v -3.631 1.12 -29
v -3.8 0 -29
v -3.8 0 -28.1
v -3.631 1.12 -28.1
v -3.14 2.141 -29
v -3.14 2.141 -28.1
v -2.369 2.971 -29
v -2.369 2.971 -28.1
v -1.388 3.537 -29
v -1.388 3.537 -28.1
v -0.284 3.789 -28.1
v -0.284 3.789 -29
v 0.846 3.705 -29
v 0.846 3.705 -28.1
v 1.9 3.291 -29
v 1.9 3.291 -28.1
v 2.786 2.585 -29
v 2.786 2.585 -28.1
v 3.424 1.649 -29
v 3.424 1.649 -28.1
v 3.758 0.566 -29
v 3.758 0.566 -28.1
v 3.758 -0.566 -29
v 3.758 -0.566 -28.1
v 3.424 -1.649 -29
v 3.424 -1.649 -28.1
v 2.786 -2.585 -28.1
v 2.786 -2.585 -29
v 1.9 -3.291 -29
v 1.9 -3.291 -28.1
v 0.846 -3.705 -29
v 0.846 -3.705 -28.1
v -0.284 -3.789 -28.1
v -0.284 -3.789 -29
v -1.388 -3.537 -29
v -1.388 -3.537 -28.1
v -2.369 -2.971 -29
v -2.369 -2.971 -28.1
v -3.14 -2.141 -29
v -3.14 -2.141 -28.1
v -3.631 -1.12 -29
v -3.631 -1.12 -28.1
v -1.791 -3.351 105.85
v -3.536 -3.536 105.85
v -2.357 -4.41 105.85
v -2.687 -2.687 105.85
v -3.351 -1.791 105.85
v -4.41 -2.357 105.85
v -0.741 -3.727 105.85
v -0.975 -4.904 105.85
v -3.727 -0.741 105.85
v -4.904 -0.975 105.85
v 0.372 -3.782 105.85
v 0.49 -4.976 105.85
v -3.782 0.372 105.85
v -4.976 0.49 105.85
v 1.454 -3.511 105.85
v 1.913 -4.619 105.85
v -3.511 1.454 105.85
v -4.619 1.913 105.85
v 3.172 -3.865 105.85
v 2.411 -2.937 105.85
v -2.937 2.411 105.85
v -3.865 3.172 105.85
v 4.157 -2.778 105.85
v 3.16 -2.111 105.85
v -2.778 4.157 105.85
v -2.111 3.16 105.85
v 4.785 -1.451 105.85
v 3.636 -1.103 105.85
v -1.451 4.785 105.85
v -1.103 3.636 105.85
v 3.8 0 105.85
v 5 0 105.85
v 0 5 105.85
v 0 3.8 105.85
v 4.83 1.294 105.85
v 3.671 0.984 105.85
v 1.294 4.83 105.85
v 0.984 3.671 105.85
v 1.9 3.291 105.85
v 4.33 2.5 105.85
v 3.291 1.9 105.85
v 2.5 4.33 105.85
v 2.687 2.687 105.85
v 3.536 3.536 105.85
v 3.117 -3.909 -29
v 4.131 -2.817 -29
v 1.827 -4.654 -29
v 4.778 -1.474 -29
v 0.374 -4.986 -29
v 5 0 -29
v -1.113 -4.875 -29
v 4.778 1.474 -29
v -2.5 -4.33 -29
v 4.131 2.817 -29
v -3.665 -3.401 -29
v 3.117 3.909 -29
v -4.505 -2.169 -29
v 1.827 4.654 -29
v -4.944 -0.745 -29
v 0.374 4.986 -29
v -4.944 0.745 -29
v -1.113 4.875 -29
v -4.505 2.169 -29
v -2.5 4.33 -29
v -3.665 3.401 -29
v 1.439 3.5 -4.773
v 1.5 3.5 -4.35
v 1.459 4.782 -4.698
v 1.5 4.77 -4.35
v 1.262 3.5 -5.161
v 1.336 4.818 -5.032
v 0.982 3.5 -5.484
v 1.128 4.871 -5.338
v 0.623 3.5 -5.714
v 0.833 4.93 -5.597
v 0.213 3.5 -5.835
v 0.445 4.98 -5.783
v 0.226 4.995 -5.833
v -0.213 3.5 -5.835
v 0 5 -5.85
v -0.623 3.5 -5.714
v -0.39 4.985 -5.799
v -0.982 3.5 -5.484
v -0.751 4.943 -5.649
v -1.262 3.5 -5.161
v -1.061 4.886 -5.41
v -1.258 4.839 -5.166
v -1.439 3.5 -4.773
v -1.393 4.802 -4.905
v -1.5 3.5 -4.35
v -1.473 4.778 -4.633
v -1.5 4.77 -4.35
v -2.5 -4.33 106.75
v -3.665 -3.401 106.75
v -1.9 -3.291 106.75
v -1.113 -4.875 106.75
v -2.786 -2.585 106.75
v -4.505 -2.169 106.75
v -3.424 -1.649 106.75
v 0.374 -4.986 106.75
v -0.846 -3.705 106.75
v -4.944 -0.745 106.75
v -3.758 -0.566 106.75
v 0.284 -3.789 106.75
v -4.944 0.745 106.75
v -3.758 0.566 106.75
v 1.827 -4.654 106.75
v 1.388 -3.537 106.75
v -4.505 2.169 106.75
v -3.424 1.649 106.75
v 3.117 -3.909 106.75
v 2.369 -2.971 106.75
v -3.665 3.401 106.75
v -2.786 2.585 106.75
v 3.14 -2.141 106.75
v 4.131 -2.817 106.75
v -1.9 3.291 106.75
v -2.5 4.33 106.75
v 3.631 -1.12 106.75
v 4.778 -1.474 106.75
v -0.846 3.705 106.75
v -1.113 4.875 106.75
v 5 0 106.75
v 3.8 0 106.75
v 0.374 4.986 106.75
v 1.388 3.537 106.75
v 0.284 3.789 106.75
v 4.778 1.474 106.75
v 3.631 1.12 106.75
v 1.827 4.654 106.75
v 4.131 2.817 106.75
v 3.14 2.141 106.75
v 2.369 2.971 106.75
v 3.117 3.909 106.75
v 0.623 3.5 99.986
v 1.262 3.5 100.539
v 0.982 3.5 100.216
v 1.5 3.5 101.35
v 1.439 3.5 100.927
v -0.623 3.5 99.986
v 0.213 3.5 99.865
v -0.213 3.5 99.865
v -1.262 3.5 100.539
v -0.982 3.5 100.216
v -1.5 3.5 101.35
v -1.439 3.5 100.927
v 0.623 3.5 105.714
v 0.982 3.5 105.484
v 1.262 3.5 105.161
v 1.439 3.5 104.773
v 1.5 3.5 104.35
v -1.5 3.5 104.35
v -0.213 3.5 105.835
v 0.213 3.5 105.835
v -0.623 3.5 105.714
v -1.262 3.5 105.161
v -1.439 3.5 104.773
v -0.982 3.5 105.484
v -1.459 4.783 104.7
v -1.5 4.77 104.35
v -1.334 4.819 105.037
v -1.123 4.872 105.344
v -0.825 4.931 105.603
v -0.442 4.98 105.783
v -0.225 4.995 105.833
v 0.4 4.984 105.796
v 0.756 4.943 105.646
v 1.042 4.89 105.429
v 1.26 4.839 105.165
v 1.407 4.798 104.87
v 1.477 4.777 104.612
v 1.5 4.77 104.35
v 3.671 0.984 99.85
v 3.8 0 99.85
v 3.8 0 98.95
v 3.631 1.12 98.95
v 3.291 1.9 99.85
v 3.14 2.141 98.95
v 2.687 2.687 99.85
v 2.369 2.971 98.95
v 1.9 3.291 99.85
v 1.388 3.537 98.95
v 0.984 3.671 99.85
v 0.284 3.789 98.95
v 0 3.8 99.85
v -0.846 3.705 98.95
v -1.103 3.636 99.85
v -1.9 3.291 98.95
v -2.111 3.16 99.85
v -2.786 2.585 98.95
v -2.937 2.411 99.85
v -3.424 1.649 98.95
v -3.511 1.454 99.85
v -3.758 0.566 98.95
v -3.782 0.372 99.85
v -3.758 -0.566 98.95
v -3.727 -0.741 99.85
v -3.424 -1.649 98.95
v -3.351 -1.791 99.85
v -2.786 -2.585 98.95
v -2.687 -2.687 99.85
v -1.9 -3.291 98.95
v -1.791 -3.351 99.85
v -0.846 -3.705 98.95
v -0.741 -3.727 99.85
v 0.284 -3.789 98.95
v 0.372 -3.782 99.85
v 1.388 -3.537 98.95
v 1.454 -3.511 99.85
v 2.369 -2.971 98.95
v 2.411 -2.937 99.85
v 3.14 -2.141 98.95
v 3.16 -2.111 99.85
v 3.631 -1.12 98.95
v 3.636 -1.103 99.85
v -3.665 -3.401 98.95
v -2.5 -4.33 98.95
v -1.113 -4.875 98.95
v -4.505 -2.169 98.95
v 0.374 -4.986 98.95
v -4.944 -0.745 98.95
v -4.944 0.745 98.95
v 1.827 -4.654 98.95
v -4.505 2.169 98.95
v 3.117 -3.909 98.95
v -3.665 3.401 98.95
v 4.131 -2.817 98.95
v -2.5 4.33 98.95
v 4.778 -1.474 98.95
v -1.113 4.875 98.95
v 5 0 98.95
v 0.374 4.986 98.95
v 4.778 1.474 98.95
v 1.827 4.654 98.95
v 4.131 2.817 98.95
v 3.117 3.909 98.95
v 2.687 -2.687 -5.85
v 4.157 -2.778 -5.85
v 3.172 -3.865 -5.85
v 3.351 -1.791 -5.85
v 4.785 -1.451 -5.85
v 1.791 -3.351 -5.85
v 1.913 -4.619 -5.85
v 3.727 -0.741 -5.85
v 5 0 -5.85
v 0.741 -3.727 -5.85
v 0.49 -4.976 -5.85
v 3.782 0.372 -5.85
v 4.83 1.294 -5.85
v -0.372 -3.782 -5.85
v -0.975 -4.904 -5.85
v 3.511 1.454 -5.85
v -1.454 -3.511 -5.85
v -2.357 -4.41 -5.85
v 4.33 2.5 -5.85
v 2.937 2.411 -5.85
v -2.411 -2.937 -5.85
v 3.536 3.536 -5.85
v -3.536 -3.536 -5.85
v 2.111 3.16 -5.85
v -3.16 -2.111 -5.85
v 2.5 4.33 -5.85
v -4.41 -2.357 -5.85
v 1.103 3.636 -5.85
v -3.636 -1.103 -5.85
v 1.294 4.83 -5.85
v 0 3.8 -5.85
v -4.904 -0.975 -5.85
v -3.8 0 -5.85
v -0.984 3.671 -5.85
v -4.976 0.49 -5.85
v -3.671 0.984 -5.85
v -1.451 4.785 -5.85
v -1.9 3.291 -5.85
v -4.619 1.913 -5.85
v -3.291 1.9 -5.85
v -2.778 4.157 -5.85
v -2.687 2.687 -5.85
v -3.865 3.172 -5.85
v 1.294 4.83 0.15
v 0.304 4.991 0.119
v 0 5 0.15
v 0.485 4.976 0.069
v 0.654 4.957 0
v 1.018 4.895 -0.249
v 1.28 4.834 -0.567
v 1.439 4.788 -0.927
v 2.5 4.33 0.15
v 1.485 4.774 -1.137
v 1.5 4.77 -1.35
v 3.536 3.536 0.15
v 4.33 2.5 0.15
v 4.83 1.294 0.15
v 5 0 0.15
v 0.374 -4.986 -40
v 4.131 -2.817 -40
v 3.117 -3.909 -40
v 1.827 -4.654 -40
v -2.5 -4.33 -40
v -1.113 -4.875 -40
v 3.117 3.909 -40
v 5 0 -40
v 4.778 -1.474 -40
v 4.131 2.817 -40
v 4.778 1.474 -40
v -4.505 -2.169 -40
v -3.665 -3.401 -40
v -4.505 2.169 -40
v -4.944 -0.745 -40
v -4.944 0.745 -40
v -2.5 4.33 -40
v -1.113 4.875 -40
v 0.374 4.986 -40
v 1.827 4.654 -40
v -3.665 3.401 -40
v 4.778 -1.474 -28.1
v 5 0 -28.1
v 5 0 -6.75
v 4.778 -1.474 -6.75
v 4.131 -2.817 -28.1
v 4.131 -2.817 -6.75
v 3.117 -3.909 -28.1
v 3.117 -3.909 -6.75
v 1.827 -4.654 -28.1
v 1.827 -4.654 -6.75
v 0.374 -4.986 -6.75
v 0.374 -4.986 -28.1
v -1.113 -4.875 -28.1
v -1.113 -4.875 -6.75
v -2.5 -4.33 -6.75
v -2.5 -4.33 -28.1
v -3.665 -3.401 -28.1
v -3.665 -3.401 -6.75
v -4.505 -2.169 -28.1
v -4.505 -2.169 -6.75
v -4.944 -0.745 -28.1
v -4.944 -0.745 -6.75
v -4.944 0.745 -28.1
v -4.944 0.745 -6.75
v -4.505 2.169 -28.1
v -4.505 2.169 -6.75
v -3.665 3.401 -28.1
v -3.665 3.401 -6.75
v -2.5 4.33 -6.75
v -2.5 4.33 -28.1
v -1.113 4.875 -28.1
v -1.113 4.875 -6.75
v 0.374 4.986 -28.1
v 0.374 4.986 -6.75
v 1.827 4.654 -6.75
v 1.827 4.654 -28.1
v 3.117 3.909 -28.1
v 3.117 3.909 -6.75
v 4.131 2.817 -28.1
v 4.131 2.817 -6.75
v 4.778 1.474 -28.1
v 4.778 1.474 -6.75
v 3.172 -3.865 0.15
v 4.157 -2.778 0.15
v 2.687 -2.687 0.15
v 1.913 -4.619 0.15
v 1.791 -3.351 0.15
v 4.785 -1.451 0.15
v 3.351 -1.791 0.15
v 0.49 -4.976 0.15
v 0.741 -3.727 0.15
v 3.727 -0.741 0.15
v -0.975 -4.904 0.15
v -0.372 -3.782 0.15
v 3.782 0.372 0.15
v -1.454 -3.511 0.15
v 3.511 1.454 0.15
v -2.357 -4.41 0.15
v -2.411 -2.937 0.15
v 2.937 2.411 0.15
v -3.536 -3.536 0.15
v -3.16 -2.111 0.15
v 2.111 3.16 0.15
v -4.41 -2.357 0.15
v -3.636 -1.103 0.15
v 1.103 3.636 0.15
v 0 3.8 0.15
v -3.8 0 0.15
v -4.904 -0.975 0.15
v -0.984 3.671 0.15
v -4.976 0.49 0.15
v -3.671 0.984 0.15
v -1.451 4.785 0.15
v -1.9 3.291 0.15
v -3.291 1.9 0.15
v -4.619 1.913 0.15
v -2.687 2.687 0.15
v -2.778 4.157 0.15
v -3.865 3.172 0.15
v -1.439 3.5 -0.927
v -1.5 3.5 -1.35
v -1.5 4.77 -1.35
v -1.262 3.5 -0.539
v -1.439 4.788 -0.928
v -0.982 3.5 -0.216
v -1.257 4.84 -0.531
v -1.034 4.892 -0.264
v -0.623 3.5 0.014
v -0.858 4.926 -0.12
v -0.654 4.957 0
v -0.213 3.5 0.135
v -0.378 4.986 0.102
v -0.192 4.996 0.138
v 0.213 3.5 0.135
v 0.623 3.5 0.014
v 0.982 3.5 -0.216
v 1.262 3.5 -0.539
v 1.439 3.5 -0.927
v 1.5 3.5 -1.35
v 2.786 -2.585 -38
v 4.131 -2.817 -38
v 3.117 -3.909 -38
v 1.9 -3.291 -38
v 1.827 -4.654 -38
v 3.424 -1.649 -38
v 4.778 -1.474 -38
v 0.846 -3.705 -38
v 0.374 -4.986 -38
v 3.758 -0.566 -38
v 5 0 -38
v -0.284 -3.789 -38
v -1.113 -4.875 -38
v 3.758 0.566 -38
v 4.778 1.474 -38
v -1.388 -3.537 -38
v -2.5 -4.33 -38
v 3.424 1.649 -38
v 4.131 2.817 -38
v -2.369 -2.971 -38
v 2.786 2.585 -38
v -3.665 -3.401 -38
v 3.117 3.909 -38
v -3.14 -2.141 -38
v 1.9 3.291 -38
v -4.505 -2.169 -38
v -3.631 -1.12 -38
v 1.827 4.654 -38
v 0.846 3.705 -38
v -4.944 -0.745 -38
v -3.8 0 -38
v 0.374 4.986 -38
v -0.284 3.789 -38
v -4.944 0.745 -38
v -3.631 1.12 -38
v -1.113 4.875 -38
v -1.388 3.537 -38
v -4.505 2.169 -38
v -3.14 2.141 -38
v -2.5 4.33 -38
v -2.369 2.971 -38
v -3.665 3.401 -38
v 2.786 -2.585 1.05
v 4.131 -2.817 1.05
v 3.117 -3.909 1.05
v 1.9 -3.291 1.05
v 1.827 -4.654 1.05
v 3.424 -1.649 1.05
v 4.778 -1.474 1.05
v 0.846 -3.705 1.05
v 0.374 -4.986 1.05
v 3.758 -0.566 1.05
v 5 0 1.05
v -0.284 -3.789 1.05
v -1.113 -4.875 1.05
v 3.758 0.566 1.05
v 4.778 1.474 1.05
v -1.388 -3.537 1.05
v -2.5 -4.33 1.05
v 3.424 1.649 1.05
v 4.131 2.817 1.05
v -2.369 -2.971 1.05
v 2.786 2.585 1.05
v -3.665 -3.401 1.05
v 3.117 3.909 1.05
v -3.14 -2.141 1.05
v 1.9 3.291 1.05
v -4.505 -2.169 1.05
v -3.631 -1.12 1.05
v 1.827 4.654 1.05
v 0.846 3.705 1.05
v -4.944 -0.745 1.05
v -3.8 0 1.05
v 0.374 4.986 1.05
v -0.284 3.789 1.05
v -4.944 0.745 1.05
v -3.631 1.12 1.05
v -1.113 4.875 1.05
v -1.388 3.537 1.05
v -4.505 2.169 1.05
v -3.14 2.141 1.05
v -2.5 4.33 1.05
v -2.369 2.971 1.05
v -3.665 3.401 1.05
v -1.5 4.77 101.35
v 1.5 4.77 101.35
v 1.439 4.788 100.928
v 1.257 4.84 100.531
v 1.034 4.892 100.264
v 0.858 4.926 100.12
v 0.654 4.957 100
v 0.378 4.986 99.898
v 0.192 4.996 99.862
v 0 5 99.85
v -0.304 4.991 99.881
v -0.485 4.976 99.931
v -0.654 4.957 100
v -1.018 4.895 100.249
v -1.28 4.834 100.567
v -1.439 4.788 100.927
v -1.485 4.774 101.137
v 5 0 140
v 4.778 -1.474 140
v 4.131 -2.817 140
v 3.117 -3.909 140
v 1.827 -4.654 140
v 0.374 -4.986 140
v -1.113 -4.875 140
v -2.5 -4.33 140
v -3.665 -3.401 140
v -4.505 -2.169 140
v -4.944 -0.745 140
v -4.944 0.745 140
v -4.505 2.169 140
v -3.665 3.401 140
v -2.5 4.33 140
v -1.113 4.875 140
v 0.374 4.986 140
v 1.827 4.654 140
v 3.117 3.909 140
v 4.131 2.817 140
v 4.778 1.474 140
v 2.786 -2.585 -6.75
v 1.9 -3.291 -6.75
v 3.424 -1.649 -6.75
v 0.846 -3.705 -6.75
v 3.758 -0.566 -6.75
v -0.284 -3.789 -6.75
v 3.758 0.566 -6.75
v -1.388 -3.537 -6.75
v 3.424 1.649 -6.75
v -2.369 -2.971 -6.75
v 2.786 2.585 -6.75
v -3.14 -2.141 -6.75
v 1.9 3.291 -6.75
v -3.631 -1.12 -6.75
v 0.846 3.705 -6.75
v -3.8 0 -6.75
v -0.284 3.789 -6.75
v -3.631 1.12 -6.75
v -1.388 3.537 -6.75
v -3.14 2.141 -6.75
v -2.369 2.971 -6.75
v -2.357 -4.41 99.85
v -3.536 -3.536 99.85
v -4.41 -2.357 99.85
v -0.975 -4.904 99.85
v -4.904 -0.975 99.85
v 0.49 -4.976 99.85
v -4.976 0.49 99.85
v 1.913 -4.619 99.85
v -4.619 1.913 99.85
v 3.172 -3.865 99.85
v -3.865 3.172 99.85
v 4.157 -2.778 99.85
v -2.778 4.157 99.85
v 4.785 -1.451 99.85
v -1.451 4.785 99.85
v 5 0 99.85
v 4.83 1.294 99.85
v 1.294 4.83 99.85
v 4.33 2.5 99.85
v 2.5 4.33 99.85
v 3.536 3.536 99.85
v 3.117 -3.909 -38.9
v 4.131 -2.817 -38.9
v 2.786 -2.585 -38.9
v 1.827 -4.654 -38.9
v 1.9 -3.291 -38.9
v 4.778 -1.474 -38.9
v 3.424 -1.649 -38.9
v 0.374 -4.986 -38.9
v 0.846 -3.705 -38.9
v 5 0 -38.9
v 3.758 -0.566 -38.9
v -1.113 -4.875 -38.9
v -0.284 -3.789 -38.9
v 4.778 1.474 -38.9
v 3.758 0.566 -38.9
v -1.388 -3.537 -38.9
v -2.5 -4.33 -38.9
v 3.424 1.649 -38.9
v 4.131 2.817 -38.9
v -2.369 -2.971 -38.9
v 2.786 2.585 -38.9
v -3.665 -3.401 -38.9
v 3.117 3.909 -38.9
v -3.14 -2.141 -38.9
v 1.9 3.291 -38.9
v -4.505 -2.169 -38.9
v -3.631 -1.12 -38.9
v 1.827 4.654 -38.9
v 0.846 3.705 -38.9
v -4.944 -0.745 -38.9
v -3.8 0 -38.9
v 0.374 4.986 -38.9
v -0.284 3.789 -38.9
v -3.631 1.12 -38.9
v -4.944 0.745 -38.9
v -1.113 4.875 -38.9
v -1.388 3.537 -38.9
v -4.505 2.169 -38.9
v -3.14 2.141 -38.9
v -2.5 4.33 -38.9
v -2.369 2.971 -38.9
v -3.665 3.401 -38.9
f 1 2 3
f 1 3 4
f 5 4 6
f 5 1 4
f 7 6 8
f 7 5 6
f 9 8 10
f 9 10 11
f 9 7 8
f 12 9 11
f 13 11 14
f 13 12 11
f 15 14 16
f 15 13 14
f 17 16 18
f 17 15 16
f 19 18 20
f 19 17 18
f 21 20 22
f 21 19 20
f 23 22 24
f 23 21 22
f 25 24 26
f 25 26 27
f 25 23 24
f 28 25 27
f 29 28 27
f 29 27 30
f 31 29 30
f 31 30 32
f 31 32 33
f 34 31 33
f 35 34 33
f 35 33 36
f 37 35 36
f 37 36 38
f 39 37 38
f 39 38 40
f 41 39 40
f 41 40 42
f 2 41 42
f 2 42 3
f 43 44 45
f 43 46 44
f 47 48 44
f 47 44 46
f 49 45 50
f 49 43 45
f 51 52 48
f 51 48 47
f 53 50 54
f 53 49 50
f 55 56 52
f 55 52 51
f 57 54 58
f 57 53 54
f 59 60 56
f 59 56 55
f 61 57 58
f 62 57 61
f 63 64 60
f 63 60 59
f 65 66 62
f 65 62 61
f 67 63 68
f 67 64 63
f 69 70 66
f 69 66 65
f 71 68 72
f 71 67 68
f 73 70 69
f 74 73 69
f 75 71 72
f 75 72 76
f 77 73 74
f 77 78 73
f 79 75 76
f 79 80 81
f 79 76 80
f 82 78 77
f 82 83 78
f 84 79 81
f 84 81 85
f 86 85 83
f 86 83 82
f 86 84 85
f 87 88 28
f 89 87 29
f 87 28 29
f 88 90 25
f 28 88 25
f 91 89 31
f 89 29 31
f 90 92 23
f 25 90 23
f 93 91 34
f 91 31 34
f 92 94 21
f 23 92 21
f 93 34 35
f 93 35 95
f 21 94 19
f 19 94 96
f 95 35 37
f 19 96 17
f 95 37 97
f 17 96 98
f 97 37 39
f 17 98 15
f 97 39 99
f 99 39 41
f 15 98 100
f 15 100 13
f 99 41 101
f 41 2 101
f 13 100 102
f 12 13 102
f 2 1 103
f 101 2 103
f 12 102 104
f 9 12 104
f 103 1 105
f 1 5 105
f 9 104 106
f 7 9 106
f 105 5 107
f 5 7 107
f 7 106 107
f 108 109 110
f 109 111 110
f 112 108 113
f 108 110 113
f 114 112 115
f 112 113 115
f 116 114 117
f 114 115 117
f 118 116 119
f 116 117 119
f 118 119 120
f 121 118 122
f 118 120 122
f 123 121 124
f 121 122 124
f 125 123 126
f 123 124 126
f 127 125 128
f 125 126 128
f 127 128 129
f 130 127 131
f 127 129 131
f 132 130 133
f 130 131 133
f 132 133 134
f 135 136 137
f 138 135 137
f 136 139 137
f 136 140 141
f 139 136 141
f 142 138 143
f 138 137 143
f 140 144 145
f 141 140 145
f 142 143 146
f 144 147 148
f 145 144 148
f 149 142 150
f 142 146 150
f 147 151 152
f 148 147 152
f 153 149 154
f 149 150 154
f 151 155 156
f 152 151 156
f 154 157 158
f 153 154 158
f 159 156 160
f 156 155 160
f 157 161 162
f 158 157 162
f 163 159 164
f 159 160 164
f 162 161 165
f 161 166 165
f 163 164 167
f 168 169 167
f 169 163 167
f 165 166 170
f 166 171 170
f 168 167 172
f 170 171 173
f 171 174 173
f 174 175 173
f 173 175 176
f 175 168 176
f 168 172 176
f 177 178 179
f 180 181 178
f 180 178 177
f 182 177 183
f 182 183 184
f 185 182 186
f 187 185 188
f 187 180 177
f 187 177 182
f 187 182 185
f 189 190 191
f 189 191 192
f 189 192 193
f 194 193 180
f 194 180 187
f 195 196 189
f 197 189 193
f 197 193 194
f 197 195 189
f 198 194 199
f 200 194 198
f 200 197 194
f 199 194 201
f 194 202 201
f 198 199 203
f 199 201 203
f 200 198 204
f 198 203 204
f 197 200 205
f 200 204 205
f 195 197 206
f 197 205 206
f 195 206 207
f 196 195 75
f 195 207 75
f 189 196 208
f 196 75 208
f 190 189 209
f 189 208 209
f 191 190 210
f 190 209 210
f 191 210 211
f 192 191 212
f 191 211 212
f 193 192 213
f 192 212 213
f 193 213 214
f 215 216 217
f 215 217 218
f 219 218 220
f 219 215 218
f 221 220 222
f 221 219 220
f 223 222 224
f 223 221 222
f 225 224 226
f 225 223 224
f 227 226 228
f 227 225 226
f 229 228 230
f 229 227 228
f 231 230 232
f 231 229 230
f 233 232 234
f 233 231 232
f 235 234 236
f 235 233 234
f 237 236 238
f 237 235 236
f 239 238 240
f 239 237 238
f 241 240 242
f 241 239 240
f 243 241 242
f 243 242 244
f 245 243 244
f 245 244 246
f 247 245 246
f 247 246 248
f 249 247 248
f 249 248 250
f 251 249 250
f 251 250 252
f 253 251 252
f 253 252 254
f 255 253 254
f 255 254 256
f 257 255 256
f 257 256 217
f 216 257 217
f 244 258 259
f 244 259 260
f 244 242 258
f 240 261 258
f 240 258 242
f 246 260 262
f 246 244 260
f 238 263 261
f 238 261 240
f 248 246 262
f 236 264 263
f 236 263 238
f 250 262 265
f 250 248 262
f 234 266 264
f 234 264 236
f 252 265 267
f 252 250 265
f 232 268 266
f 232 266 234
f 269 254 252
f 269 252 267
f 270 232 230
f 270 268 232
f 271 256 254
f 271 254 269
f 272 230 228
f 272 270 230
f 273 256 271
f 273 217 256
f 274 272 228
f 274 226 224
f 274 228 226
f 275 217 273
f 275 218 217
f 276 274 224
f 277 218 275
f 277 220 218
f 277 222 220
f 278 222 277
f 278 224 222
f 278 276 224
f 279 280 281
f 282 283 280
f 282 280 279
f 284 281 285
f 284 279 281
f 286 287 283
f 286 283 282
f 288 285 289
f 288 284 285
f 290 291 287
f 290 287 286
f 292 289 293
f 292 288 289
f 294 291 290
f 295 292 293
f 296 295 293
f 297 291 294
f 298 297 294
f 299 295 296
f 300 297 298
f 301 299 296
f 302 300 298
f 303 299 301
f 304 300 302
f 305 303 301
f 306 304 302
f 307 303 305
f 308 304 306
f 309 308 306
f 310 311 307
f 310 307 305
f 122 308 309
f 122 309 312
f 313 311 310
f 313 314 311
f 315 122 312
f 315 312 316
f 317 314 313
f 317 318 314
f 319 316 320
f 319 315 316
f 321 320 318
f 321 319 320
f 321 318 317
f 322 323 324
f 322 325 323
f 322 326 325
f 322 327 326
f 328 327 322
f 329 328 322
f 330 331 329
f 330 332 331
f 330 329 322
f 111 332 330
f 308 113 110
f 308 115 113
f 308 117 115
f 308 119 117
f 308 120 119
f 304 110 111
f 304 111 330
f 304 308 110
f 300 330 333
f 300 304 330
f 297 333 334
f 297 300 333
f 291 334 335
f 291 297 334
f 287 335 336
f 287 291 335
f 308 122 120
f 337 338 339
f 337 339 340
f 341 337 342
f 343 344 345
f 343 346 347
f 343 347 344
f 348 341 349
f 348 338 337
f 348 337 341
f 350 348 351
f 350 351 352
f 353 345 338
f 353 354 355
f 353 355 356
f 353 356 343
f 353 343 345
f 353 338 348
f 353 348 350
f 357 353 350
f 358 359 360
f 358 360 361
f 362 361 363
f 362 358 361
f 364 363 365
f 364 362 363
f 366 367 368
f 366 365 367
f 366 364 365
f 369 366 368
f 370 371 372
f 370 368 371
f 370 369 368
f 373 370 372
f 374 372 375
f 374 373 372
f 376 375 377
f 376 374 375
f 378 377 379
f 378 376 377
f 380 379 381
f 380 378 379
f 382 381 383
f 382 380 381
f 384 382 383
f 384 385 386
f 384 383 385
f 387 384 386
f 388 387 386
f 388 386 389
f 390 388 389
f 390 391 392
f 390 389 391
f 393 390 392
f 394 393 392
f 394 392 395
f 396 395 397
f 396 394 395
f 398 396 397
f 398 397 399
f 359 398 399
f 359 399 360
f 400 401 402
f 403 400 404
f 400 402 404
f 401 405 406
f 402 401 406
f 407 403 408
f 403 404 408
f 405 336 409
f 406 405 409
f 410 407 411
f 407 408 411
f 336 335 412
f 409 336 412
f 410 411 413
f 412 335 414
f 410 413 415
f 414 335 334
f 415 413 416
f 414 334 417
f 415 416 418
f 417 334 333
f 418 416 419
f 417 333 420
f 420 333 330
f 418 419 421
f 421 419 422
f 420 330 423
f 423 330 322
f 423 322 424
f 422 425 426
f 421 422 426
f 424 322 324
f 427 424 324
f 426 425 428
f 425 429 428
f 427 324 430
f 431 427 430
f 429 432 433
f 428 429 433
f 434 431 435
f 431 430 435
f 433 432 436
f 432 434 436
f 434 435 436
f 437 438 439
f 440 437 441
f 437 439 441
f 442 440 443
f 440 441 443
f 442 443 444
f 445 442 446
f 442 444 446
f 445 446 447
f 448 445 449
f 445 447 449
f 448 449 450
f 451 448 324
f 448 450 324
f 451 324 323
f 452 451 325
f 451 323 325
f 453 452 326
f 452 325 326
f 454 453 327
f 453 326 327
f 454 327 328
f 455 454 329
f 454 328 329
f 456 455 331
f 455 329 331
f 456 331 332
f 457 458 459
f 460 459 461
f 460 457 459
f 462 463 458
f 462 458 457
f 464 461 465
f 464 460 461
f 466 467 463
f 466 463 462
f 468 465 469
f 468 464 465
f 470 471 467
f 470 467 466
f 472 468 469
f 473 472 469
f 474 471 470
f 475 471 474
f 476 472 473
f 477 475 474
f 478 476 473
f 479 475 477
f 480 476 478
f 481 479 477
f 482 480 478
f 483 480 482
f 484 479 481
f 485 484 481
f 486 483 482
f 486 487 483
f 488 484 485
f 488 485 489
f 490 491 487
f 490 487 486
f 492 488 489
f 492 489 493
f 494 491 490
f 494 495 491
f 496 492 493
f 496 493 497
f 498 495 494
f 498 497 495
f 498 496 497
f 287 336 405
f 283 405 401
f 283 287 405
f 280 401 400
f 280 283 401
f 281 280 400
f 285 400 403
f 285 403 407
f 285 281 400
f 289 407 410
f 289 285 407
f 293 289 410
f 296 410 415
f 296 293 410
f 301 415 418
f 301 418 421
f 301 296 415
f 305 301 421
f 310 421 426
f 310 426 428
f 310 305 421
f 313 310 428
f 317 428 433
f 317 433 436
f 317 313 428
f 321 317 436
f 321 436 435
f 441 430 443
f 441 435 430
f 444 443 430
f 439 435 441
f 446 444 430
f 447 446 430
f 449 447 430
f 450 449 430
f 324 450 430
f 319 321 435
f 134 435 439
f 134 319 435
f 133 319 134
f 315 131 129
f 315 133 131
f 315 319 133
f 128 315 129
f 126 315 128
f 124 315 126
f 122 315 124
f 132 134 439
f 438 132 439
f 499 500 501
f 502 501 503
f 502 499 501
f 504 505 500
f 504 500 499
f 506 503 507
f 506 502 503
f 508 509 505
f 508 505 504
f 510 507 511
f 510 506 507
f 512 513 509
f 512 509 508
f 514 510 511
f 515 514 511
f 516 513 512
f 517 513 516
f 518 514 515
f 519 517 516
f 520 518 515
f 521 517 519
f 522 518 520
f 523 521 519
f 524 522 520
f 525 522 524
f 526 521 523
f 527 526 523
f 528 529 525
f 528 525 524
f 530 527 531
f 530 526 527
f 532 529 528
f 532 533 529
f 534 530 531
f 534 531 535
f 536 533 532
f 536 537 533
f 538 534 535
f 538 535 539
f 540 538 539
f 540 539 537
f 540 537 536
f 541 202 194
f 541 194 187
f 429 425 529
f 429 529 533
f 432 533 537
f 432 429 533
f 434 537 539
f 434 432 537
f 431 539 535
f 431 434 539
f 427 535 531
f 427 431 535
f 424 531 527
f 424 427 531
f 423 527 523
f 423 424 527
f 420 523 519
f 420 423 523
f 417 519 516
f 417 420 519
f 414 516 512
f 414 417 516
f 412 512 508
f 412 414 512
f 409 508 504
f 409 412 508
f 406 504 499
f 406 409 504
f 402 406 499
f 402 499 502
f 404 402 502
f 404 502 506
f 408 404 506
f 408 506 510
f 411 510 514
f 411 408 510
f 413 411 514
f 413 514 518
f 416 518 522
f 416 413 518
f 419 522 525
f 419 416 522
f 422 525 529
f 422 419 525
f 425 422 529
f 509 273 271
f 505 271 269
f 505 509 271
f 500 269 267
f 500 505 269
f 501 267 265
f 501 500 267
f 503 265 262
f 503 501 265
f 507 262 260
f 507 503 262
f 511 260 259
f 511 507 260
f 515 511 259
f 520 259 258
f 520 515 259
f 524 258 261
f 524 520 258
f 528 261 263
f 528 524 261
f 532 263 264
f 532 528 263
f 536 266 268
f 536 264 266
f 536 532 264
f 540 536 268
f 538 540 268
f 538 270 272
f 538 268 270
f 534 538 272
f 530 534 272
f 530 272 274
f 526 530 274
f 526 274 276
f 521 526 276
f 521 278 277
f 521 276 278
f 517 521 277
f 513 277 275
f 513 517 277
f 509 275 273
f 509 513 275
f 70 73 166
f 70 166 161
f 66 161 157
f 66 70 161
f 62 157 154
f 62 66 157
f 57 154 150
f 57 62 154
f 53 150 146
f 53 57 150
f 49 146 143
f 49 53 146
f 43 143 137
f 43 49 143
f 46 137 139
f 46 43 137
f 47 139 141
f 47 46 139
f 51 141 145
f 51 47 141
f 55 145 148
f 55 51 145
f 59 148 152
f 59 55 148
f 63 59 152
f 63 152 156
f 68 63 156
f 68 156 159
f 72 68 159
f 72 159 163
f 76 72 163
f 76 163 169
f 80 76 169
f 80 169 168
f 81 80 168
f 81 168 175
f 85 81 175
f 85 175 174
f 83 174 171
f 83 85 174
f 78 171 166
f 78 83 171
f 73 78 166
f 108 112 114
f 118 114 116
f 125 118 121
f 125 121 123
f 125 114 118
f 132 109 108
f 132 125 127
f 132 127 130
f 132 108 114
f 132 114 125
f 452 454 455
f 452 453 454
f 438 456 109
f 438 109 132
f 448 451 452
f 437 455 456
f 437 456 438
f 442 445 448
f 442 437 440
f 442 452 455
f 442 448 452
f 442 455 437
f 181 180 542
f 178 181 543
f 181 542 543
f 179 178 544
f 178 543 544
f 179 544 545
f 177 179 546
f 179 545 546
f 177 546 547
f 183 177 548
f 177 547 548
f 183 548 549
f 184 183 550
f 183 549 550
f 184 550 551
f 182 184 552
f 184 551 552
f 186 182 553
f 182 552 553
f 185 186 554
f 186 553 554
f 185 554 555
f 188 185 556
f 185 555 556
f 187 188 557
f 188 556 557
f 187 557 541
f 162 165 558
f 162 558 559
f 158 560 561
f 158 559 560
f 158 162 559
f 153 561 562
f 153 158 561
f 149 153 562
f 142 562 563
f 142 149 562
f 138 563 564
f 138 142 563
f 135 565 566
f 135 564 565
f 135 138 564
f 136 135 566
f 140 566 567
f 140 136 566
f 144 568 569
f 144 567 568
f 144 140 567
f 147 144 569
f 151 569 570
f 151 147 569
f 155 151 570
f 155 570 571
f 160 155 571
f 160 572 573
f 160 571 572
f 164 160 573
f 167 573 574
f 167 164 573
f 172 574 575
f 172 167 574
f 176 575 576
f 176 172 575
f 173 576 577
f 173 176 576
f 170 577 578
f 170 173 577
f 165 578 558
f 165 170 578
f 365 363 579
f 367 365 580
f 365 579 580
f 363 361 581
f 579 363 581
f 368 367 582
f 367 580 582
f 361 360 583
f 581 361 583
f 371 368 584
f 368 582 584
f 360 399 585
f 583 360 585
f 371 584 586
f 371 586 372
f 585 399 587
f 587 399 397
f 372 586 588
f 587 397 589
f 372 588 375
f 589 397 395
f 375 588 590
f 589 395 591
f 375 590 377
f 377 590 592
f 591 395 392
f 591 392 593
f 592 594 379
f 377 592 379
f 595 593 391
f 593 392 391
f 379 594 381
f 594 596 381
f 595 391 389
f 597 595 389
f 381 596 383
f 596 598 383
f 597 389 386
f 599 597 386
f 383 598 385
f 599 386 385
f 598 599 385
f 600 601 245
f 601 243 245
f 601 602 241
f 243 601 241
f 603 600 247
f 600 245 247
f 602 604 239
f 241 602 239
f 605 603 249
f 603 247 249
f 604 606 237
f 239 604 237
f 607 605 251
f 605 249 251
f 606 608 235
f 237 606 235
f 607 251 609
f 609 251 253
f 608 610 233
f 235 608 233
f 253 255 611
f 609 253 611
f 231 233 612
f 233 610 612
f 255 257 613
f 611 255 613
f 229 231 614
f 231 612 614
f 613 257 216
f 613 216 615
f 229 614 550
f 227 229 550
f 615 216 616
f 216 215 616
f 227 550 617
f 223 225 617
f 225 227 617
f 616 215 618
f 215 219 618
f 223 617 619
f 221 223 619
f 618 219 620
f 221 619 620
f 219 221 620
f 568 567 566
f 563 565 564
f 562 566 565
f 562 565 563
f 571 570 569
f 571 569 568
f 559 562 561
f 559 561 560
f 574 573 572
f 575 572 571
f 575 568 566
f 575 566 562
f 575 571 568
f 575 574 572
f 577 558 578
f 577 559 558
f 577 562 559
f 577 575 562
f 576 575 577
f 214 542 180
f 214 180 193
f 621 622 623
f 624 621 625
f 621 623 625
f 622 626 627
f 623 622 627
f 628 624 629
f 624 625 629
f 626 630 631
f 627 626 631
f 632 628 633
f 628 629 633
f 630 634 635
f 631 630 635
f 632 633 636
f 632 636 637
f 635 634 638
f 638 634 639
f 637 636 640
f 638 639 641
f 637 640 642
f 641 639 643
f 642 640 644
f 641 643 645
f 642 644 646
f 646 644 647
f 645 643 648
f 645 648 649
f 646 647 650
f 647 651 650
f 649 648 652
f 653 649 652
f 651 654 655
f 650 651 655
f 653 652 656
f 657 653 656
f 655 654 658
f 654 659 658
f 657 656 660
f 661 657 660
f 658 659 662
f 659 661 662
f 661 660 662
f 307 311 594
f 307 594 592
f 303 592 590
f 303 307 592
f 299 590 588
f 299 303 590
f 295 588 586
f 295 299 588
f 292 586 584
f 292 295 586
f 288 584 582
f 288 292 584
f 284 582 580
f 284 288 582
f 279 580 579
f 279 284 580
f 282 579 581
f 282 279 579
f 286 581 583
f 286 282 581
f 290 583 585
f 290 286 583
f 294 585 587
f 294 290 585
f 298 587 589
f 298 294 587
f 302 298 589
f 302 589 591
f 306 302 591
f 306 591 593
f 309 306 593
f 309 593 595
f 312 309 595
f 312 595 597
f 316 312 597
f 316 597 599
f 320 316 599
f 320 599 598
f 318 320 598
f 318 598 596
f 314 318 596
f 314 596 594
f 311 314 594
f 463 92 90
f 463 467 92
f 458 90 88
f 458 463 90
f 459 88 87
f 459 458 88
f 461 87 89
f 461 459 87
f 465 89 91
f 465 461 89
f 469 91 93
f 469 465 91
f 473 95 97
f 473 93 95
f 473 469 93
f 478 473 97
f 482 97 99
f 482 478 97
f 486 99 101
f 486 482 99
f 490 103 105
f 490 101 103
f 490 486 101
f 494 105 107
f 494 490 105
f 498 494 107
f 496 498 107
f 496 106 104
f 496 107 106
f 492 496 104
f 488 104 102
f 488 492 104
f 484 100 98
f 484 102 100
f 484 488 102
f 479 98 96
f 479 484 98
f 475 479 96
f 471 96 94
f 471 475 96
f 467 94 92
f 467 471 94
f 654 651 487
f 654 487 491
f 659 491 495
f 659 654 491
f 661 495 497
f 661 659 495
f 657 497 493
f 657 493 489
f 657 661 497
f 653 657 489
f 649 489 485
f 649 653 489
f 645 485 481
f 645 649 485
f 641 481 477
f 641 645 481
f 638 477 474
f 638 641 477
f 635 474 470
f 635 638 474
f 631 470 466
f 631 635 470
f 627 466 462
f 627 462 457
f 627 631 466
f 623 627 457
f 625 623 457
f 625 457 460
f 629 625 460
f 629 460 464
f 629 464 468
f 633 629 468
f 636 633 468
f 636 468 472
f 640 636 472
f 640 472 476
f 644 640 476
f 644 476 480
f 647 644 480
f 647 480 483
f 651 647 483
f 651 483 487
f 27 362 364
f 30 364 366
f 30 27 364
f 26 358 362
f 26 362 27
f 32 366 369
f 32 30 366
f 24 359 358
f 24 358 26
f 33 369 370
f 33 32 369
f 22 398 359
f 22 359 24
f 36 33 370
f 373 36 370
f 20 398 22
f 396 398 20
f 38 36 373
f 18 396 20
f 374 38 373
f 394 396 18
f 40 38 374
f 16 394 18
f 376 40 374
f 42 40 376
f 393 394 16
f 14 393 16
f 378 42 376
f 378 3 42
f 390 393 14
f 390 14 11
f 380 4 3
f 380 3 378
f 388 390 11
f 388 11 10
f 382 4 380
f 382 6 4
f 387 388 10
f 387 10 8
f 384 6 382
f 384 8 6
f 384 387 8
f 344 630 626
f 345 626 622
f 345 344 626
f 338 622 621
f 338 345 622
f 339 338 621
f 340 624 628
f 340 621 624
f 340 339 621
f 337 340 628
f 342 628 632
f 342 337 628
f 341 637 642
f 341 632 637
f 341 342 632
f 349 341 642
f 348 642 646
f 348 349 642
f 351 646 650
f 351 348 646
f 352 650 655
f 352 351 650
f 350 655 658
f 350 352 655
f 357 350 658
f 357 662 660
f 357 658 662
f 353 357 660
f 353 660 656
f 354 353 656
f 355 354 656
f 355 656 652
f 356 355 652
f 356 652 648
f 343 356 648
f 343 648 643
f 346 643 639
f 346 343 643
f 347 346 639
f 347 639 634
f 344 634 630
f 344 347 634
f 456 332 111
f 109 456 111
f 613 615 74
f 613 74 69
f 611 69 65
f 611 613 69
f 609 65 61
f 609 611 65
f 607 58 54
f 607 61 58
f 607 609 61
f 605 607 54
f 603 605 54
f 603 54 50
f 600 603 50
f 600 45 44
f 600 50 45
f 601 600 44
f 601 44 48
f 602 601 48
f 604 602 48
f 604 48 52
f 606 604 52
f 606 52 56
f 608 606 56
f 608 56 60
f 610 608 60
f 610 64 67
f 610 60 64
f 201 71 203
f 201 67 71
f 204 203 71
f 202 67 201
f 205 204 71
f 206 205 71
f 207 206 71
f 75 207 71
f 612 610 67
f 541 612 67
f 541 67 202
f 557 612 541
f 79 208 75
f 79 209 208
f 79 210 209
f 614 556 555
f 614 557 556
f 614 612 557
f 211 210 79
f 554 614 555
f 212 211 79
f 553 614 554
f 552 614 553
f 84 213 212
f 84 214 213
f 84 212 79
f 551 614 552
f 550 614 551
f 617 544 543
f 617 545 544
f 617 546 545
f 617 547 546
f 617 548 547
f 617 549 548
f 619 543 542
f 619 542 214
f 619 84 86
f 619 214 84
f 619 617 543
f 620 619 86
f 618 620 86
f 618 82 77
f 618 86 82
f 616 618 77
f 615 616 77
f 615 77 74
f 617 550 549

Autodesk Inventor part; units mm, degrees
sketch "Skizze1" plane through (0, 0, 0) normal (0, 0, 1) x (1, 0, 0)
  circle A0 centre (0, 0) radius 5
  dimension "d0" = 10
extrude "Extrusion1" add sketch "Skizze1" along normal blind 100
sketch "Skizze4" plane through (0, 0, 0) normal (0, 0, -1) x (-1, 0, 0)
  circle A0 centre (0, 0) radius 5
  circle A1 centre (0, 0) radius 5
  dimension "d15" = 10
extrude "Extrusion4" add sketch "Skizze4" along normal blind 50
sketch "Skizze5" plane through (0, 0, 100) normal (0, 0, 1) x (1, 0, 0)
  circle A0 centre (0, 0) radius 5
extrude "Extrusion5" add sketch "Skizze5" along normal blind 50
ref_plane "Arbeitsebene1" through (0, 5, 0) normal (0, 1, 0) x (-1, 0, 0)
sketch "Skizze6" plane through (0, 5, 0) normal (0, 1, 0) x (-1, 0, 0)
  line L0 (-5, -50) -> (5, -50) projected
  line L1 (0, -50) -> (0, 50)
  line L2 (0, 50) -> (0, 102.85)
  line L3 (0, 50) -> (0, -2.85)
  line L4 (0, -4.35) -> (0, -1.35) construction
  line L5 (1.5, -4.35) -> (1.5, -1.35)
  line L6 (-1.5, -1.35) -> (-1.5, -4.35)
  arc A0 (-1.5, -4.35) -> (1.5, -4.35) centre (0, -4.35) ccw
  arc A1 (1.5, -1.35) -> (-1.5, -1.35) centre (0, -1.35) ccw
  line L7 (0, 101.35) -> (0, 104.35) construction
  line L8 (-1.5, 101.35) -> (-1.5, 104.35)
  line L9 (1.5, 104.35) -> (1.5, 101.35)
  arc A2 (-1.5, 101.35) -> (1.5, 101.35) centre (0, 101.35) ccw
  arc A3 (1.5, 104.35) -> (-1.5, 104.35) centre (0, 104.35) ccw
  point P0 (0, 0)
  dimension "d21" = 100
  dimension "d22" = 52.85
  dimension "d23" = 52.85
  dimension "d27" = 1.5
  dimension "d28" = 6
  dimension "d29" = 1.5
  dimension "d33" = 3
extrude "Extrusion6" cut sketch "Skizze6" against normal blind 1.5
ref_plane "Arbeitsebene3" through (0, 5, 105.85) normal (0, 0, 1) x (1, 0, 0)
ref_plane "Arbeitsebene2" through (0, 5, 99.85) normal (0, 0, 1) x (1, 0, 0)
ref_plane "Arbeitsebene5" through (0, 5, -5.85) normal (0, 0, -1) x (-1, 0, 0)
ref_plane "Arbeitsebene4" through (0, 5, 0.15) normal (0, 0, -1) x (-1, 0, 0)
sketch "Skizze7" plane through (0, 5, -5.85) normal (0, 0, -1) x (-1, 0, 0)
  circle A0 centre (0, -5) radius 5
  circle A1 centre (0, -5) radius 3.8
  dimension "d34" = 7.6
extrude "Extrusion7" cut sketch "Skizze7" along normal blind 0.9
sketch "Skizze8" plane through (0, 5, 0.15) normal (0, 0, -1) x (-1, 0, 0)
  circle A0 centre (0, -5) radius 5
  circle A1 centre (0, -5) radius 3.8
  dimension "d37" = 7.6
extrude "Extrusion8" cut sketch "Skizze8" against normal blind 0.9
sketch "Skizze9" plane through (0, 5, 99.85) normal (0, 0, 1) x (1, 0, 0)
  circle A0 centre (0, -5) radius 5
  circle A1 centre (0, -5) radius 3.8
  dimension "d40" = 7.6
extrude "Extrusion9" cut sketch "Skizze9" against normal blind 0.9
sketch "Skizze10" plane through (0, 5, 105.85) normal (0, 0, 1) x (1, 0, 0)
  circle A0 centre (0, -5) radius 5
  circle A1 centre (0, -5) radius 3.8
extrude "Extrusion10" cut sketch "Skizze10" along normal blind 0.9
ref_plane "Arbeitsebene8" through (0, 0, -48.9) normal (0, 0, -1) x (-1, 0, 0)
sketch "Skizze13" plane through (0, 0, -48.9) normal (0, 0, -1) x (-1, 0, 0)
  circle A0 centre (0, 0) radius 5
  circle A1 centre (0, 0) radius 3.8
  dimension "d51" = 10
  dimension "d52" = 7.6
extrude "Extrusion11" cut sketch "Skizze13" against normal blind 0.9
sketch "Skizze14" plane through (0, 0, -50) normal (0, 0, -1) x (-1, 0, 0)
  circle A0 centre (0, 0) radius 3.8 projected
  circle A1 centre (0, 0) radius 5.0103
  point P0 (0, 3.8)
extrude "Extrusion12" cut sketch "Skizze14" against normal blind 10 contours A0 | A1
sketch "Skizze15" plane through (0, 0, 150) normal (0, 0, 1) x (1, 0, 0)
  circle A0 centre (0, 0) radius 5
  dimension "d57" = 10
extrude "Extrusion13" cut sketch "Skizze15" against normal blind 10
ref_plane "Arbeitsebene9" through (0, 0, -38.9) normal (0, 0, -1) x (-1, 0, 0)
sketch "Skizze16" plane through (0, 0, -38.9) normal (0, 0, -1) x (-1, 0, 0)
  circle A0 centre (0, 0) radius 5
  circle A1 centre (0, 0) radius 3.8
  dimension "d61" = 10
  dimension "d62" = 7.6
extrude "Extrusion14" cut sketch "Skizze16" against normal blind 0.9
ref_plane "Arbeitsebene10" through (0, 0, -29) normal (0, 0, -1) x (-1, 0, 0)
sketch "Skizze17" plane through (0, 0, -29) normal (0, 0, -1) x (-1, 0, 0)
  circle A0 centre (0, 0) radius 5
  circle A1 centre (0, 0) radius 3.8
extrude "Extrusion15" cut sketch "Skizze17" against normal blind 0.9
properties part number "Förderbandwelle_hinten"
